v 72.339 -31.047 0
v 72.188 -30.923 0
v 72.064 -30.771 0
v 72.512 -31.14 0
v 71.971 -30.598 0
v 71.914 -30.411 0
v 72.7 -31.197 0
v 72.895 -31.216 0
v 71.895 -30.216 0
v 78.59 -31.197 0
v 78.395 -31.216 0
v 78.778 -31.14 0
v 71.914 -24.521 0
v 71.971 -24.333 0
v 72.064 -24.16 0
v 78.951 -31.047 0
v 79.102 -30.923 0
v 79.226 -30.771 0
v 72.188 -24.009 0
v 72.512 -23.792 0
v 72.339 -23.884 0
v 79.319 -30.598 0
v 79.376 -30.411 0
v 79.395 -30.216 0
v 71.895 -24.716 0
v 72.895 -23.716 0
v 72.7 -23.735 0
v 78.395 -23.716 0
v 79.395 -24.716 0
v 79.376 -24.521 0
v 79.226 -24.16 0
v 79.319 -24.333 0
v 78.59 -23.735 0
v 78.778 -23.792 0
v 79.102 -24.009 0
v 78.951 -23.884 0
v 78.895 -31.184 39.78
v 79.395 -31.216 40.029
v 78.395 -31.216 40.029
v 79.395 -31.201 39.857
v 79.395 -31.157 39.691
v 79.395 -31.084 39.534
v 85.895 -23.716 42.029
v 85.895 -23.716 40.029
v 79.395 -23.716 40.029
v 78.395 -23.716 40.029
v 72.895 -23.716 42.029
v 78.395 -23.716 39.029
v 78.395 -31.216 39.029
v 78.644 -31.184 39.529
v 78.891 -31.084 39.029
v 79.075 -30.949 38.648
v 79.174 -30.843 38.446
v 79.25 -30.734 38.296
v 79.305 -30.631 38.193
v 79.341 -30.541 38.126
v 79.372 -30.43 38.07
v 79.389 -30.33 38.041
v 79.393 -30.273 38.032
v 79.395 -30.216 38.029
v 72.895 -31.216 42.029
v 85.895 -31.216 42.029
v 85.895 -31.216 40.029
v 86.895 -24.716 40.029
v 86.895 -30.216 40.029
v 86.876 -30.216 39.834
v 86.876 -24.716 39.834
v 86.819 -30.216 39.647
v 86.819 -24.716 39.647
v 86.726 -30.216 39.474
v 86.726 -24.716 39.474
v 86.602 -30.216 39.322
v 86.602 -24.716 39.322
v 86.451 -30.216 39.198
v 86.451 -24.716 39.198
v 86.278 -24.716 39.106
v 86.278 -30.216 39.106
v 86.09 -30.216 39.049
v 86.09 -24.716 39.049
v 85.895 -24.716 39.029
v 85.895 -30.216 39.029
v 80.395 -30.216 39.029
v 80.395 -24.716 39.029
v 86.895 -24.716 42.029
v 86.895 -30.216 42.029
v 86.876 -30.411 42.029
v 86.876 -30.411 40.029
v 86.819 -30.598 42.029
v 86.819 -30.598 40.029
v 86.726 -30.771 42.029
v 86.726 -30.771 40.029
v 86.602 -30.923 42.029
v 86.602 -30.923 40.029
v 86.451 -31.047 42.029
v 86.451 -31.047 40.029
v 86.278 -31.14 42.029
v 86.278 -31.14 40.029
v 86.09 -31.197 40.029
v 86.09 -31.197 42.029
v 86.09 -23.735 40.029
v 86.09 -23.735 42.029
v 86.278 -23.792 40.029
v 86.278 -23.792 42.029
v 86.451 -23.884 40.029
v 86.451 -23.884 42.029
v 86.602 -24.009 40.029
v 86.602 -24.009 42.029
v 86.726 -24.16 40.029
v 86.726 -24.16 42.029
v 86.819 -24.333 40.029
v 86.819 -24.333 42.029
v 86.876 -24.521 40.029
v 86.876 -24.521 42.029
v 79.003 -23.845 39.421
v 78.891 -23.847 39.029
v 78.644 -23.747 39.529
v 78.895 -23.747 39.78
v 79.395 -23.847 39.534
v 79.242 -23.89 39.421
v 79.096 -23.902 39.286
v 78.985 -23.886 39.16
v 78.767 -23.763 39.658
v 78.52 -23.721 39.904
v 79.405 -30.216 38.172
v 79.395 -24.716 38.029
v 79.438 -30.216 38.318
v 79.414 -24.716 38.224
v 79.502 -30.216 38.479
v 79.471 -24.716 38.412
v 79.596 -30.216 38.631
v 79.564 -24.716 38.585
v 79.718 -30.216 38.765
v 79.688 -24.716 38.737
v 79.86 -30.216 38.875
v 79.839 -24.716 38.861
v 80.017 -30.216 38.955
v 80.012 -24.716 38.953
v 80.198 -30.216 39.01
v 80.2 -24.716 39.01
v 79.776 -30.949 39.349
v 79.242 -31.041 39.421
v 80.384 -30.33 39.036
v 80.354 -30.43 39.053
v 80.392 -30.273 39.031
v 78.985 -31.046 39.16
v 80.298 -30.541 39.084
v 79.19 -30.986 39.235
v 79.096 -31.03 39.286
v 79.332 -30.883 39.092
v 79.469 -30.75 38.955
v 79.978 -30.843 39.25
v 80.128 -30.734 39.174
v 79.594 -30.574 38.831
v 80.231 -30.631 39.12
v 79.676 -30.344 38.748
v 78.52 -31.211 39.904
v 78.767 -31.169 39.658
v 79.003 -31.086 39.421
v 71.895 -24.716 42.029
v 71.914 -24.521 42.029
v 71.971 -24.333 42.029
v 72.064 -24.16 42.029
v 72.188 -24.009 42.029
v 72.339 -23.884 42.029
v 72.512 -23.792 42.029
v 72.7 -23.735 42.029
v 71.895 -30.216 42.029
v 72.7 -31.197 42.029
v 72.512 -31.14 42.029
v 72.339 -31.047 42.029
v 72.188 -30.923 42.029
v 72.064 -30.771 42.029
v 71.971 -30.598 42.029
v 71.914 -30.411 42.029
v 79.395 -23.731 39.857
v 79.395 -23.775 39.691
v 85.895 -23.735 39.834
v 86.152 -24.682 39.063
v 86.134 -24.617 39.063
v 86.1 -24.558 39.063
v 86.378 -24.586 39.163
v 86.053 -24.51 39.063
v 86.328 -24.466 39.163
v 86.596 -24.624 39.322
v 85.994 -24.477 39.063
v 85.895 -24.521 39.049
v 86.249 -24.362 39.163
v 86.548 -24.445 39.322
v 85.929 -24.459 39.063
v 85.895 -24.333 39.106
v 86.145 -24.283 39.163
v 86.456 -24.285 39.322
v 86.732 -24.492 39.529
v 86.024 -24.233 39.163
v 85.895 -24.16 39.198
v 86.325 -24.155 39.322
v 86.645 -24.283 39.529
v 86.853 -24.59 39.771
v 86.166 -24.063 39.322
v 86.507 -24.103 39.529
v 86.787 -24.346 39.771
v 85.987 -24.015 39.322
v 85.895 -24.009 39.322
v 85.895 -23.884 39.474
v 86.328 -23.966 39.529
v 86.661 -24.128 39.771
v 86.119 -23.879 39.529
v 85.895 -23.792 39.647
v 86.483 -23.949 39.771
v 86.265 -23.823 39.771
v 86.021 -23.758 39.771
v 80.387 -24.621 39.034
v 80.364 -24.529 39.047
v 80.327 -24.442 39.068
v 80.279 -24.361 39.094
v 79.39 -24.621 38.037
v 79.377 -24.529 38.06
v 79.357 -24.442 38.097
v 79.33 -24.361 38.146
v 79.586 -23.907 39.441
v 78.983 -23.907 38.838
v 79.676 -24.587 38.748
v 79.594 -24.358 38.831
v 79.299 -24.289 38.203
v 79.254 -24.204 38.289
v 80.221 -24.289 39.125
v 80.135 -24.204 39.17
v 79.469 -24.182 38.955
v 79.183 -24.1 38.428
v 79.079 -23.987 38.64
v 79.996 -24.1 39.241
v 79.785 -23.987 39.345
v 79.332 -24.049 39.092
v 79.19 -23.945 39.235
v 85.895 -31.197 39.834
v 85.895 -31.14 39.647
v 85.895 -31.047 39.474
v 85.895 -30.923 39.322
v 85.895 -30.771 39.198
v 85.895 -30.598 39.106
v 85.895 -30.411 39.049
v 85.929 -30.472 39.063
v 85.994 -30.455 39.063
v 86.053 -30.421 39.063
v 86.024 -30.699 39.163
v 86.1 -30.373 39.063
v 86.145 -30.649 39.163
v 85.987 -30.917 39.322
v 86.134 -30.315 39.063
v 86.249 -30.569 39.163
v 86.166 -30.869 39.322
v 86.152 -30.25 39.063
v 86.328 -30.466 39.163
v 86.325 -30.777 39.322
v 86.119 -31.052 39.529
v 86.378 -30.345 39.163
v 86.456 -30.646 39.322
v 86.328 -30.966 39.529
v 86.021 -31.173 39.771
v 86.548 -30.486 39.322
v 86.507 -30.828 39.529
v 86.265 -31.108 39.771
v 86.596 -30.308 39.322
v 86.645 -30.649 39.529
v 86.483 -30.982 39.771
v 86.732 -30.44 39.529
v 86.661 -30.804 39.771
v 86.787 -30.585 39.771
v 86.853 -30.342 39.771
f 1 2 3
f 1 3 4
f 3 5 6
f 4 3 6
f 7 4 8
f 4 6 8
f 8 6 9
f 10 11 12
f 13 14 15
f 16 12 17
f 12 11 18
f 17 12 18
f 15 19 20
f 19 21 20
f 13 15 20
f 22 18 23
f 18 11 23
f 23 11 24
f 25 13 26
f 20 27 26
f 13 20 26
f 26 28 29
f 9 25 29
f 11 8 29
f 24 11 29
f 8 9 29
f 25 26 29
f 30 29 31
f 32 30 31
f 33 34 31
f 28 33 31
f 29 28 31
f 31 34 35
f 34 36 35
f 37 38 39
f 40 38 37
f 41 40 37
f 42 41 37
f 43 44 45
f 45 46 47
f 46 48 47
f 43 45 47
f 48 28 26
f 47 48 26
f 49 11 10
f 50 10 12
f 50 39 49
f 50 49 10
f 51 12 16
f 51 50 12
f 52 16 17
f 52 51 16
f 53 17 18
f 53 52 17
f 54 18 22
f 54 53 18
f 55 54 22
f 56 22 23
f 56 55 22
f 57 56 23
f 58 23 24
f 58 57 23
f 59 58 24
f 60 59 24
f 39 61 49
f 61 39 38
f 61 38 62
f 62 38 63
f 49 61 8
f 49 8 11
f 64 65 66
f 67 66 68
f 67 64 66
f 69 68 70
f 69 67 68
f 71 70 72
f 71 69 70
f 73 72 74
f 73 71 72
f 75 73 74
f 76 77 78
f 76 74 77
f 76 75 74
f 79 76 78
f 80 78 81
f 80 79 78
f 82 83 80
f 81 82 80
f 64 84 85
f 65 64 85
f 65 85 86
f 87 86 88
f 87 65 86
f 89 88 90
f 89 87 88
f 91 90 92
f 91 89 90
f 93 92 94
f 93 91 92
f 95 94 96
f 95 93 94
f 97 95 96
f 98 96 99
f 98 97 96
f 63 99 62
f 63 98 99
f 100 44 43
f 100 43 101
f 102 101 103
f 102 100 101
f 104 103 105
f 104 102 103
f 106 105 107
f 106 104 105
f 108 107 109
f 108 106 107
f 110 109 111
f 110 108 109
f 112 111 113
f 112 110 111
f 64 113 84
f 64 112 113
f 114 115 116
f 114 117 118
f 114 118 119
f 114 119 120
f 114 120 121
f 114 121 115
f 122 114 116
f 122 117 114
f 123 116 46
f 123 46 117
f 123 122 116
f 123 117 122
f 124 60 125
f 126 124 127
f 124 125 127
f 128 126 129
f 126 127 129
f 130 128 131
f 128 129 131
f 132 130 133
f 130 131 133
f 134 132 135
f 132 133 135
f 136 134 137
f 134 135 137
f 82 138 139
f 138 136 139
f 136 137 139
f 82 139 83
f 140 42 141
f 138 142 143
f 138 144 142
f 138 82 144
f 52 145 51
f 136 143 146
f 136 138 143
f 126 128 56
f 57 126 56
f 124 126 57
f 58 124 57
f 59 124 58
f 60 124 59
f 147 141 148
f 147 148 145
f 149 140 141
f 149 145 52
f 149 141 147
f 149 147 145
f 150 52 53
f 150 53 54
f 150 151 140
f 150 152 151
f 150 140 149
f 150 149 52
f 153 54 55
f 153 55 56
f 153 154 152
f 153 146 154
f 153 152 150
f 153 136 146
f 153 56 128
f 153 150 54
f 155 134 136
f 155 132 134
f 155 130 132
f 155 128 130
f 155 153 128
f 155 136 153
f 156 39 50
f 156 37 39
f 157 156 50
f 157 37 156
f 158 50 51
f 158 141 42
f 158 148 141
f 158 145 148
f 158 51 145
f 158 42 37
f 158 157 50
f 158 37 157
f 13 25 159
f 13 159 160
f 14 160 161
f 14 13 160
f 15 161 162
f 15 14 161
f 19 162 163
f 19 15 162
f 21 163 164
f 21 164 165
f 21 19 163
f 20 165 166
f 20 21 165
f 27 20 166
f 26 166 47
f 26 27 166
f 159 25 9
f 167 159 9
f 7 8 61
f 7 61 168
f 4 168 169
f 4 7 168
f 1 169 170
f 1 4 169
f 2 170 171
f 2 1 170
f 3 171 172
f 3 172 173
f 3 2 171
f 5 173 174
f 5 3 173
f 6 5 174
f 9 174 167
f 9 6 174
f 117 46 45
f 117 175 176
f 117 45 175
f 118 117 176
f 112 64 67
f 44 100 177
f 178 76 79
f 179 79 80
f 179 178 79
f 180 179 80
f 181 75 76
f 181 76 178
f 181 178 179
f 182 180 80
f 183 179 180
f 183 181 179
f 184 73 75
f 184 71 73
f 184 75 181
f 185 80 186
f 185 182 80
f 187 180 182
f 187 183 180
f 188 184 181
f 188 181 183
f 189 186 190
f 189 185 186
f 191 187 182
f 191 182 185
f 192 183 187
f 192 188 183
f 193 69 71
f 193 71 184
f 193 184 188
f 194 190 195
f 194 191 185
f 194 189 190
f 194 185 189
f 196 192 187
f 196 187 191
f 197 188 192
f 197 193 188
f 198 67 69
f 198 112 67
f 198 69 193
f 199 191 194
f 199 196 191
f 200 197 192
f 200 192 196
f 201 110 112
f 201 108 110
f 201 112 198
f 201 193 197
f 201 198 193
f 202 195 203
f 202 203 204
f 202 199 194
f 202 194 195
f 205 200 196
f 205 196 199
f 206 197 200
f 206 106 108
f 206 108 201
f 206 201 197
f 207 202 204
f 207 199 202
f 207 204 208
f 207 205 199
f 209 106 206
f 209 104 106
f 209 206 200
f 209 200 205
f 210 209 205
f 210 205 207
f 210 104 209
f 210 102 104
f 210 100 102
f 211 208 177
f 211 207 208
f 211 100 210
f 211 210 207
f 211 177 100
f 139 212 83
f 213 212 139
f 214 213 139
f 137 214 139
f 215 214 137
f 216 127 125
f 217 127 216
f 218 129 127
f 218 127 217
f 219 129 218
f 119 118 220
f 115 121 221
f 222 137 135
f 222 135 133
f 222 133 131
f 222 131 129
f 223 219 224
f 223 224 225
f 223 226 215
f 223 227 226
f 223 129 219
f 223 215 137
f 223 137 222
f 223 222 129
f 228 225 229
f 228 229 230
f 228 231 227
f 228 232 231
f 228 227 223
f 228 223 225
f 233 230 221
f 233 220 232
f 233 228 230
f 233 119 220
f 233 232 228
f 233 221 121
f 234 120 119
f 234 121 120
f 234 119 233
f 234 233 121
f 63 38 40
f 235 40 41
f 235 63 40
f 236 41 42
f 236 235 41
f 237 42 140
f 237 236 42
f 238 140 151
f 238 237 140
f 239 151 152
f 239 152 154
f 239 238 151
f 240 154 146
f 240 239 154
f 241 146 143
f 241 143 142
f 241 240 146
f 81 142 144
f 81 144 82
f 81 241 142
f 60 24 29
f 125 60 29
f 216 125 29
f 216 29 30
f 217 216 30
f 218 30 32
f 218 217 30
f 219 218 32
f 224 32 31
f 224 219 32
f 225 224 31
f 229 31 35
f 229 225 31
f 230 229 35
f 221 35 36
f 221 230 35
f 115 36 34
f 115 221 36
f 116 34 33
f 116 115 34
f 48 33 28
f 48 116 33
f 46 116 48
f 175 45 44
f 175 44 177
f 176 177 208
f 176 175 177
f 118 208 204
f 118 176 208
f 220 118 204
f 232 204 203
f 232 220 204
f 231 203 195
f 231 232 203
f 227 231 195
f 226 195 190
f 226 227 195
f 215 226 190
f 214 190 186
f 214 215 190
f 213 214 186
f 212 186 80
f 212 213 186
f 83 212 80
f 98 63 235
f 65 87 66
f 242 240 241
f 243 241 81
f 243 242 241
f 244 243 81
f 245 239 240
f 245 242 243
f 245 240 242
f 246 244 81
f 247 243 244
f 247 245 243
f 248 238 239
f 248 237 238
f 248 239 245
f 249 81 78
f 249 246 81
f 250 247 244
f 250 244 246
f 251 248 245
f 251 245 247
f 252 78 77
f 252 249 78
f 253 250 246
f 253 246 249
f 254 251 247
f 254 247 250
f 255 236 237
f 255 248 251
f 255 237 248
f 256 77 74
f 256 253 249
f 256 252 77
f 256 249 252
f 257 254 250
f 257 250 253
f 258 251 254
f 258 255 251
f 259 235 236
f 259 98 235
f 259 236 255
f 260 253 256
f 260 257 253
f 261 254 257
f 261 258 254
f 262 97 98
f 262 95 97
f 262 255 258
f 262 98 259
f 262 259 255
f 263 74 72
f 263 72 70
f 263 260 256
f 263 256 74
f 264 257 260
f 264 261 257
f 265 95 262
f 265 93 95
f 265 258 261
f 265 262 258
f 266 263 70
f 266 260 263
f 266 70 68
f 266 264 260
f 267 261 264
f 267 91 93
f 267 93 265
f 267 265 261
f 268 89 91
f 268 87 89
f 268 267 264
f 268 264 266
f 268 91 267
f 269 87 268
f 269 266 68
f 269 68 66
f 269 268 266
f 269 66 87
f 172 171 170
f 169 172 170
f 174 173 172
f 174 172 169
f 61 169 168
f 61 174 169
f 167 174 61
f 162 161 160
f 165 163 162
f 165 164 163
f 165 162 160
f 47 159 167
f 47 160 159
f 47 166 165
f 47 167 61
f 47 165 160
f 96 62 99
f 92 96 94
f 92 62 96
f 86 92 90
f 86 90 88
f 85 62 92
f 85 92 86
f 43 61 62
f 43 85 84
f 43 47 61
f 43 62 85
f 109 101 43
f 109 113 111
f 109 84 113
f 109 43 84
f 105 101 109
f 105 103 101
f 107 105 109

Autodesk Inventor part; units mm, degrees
ref_plane "YZ Plane" through (0, 0, 0) normal (1, 0, 0) x (0, 1, 0)
ref_plane "XZ Plane" through (0, 0, 0) normal (0, 1, 0) x (-1, 0, 0)
sketch "Sketch1" plane through (0, 0, 0) normal (0, 0, 1) x (1, 0, 0)
  line L0 (79.395, -155.8766) -> (79.395, 6.5) projected
  line L1 (-8.605, 6.5) -> (-8.605, -107.0766) projected
  line L2 (69.9453, -18.7158) -> (55.4353, -18.7158) projected
  line L3 (79.395, -18.7158) -> (79.395, -23.7158)
  line L4 (79.395, -23.7158) -> (71.895, -23.7158)
  line L5 (71.895, -23.7158) -> (71.895, -31.2158)
  line L6 (71.895, -31.2158) -> (79.395, -31.2158)
  line L7 (79.395, -31.2158) -> (79.395, -23.7158)
  point P0 (0, 0)
  dimension "d0" = 5
  dimension "d1" = 7.5
  dimension "d2" = 7.5
ref_plane "Work Plane1" through (-121.6053, -233.9347, 42.0294) normal (0, 0, -1) x (0, 1, 0)
extrude "Extrusion1" add sketch "Sketch1" along normal up to surface (42.0294 mm away)
sketch "Sketch2" plane through (71.895, -23.7158, 42.0294) normal (0, 0, 1) x (1, 0, 0)
  line L0 (7.5, 0) -> (0, 0) projected
  line L1 (0, 0) -> (15, 0)
  line L2 (15, 0) -> (15, -7.5)
  line L3 (15, -7.5) -> (0, -7.5)
  line L4 (0, -7.5) -> (0, 0)
  point P0 (-71.895, 23.7158)
  dimension "d5" = 15
extrude "Extrusion2" add sketch "Sketch2" against normal blind 3
fillet "Fillet1" radius 1 6 edges at (79.395, -23.7158, 19.5147) (71.895, -23.7158, 21.0147) (79.395, -31.2158, 19.5147) (71.895, -31.2158, 21.0147) (86.895, -23.7158, 40.5294) (86.895, -31.2158, 40.5294)
fillet "Fillet2" radius 1 5 edges at (86.6021, -30.9229, 39.0294) (78.895, -31.2158, 39.0294) (86.6021, -24.0087, 39.0294) (78.895, -23.7158, 39.0294) (86.895, -27.4658, 39.0294)
fillet "Fillet3" radius 1 1 edges at (79.395, -27.4658, 39.0294)
properties part number "TableLeg"
